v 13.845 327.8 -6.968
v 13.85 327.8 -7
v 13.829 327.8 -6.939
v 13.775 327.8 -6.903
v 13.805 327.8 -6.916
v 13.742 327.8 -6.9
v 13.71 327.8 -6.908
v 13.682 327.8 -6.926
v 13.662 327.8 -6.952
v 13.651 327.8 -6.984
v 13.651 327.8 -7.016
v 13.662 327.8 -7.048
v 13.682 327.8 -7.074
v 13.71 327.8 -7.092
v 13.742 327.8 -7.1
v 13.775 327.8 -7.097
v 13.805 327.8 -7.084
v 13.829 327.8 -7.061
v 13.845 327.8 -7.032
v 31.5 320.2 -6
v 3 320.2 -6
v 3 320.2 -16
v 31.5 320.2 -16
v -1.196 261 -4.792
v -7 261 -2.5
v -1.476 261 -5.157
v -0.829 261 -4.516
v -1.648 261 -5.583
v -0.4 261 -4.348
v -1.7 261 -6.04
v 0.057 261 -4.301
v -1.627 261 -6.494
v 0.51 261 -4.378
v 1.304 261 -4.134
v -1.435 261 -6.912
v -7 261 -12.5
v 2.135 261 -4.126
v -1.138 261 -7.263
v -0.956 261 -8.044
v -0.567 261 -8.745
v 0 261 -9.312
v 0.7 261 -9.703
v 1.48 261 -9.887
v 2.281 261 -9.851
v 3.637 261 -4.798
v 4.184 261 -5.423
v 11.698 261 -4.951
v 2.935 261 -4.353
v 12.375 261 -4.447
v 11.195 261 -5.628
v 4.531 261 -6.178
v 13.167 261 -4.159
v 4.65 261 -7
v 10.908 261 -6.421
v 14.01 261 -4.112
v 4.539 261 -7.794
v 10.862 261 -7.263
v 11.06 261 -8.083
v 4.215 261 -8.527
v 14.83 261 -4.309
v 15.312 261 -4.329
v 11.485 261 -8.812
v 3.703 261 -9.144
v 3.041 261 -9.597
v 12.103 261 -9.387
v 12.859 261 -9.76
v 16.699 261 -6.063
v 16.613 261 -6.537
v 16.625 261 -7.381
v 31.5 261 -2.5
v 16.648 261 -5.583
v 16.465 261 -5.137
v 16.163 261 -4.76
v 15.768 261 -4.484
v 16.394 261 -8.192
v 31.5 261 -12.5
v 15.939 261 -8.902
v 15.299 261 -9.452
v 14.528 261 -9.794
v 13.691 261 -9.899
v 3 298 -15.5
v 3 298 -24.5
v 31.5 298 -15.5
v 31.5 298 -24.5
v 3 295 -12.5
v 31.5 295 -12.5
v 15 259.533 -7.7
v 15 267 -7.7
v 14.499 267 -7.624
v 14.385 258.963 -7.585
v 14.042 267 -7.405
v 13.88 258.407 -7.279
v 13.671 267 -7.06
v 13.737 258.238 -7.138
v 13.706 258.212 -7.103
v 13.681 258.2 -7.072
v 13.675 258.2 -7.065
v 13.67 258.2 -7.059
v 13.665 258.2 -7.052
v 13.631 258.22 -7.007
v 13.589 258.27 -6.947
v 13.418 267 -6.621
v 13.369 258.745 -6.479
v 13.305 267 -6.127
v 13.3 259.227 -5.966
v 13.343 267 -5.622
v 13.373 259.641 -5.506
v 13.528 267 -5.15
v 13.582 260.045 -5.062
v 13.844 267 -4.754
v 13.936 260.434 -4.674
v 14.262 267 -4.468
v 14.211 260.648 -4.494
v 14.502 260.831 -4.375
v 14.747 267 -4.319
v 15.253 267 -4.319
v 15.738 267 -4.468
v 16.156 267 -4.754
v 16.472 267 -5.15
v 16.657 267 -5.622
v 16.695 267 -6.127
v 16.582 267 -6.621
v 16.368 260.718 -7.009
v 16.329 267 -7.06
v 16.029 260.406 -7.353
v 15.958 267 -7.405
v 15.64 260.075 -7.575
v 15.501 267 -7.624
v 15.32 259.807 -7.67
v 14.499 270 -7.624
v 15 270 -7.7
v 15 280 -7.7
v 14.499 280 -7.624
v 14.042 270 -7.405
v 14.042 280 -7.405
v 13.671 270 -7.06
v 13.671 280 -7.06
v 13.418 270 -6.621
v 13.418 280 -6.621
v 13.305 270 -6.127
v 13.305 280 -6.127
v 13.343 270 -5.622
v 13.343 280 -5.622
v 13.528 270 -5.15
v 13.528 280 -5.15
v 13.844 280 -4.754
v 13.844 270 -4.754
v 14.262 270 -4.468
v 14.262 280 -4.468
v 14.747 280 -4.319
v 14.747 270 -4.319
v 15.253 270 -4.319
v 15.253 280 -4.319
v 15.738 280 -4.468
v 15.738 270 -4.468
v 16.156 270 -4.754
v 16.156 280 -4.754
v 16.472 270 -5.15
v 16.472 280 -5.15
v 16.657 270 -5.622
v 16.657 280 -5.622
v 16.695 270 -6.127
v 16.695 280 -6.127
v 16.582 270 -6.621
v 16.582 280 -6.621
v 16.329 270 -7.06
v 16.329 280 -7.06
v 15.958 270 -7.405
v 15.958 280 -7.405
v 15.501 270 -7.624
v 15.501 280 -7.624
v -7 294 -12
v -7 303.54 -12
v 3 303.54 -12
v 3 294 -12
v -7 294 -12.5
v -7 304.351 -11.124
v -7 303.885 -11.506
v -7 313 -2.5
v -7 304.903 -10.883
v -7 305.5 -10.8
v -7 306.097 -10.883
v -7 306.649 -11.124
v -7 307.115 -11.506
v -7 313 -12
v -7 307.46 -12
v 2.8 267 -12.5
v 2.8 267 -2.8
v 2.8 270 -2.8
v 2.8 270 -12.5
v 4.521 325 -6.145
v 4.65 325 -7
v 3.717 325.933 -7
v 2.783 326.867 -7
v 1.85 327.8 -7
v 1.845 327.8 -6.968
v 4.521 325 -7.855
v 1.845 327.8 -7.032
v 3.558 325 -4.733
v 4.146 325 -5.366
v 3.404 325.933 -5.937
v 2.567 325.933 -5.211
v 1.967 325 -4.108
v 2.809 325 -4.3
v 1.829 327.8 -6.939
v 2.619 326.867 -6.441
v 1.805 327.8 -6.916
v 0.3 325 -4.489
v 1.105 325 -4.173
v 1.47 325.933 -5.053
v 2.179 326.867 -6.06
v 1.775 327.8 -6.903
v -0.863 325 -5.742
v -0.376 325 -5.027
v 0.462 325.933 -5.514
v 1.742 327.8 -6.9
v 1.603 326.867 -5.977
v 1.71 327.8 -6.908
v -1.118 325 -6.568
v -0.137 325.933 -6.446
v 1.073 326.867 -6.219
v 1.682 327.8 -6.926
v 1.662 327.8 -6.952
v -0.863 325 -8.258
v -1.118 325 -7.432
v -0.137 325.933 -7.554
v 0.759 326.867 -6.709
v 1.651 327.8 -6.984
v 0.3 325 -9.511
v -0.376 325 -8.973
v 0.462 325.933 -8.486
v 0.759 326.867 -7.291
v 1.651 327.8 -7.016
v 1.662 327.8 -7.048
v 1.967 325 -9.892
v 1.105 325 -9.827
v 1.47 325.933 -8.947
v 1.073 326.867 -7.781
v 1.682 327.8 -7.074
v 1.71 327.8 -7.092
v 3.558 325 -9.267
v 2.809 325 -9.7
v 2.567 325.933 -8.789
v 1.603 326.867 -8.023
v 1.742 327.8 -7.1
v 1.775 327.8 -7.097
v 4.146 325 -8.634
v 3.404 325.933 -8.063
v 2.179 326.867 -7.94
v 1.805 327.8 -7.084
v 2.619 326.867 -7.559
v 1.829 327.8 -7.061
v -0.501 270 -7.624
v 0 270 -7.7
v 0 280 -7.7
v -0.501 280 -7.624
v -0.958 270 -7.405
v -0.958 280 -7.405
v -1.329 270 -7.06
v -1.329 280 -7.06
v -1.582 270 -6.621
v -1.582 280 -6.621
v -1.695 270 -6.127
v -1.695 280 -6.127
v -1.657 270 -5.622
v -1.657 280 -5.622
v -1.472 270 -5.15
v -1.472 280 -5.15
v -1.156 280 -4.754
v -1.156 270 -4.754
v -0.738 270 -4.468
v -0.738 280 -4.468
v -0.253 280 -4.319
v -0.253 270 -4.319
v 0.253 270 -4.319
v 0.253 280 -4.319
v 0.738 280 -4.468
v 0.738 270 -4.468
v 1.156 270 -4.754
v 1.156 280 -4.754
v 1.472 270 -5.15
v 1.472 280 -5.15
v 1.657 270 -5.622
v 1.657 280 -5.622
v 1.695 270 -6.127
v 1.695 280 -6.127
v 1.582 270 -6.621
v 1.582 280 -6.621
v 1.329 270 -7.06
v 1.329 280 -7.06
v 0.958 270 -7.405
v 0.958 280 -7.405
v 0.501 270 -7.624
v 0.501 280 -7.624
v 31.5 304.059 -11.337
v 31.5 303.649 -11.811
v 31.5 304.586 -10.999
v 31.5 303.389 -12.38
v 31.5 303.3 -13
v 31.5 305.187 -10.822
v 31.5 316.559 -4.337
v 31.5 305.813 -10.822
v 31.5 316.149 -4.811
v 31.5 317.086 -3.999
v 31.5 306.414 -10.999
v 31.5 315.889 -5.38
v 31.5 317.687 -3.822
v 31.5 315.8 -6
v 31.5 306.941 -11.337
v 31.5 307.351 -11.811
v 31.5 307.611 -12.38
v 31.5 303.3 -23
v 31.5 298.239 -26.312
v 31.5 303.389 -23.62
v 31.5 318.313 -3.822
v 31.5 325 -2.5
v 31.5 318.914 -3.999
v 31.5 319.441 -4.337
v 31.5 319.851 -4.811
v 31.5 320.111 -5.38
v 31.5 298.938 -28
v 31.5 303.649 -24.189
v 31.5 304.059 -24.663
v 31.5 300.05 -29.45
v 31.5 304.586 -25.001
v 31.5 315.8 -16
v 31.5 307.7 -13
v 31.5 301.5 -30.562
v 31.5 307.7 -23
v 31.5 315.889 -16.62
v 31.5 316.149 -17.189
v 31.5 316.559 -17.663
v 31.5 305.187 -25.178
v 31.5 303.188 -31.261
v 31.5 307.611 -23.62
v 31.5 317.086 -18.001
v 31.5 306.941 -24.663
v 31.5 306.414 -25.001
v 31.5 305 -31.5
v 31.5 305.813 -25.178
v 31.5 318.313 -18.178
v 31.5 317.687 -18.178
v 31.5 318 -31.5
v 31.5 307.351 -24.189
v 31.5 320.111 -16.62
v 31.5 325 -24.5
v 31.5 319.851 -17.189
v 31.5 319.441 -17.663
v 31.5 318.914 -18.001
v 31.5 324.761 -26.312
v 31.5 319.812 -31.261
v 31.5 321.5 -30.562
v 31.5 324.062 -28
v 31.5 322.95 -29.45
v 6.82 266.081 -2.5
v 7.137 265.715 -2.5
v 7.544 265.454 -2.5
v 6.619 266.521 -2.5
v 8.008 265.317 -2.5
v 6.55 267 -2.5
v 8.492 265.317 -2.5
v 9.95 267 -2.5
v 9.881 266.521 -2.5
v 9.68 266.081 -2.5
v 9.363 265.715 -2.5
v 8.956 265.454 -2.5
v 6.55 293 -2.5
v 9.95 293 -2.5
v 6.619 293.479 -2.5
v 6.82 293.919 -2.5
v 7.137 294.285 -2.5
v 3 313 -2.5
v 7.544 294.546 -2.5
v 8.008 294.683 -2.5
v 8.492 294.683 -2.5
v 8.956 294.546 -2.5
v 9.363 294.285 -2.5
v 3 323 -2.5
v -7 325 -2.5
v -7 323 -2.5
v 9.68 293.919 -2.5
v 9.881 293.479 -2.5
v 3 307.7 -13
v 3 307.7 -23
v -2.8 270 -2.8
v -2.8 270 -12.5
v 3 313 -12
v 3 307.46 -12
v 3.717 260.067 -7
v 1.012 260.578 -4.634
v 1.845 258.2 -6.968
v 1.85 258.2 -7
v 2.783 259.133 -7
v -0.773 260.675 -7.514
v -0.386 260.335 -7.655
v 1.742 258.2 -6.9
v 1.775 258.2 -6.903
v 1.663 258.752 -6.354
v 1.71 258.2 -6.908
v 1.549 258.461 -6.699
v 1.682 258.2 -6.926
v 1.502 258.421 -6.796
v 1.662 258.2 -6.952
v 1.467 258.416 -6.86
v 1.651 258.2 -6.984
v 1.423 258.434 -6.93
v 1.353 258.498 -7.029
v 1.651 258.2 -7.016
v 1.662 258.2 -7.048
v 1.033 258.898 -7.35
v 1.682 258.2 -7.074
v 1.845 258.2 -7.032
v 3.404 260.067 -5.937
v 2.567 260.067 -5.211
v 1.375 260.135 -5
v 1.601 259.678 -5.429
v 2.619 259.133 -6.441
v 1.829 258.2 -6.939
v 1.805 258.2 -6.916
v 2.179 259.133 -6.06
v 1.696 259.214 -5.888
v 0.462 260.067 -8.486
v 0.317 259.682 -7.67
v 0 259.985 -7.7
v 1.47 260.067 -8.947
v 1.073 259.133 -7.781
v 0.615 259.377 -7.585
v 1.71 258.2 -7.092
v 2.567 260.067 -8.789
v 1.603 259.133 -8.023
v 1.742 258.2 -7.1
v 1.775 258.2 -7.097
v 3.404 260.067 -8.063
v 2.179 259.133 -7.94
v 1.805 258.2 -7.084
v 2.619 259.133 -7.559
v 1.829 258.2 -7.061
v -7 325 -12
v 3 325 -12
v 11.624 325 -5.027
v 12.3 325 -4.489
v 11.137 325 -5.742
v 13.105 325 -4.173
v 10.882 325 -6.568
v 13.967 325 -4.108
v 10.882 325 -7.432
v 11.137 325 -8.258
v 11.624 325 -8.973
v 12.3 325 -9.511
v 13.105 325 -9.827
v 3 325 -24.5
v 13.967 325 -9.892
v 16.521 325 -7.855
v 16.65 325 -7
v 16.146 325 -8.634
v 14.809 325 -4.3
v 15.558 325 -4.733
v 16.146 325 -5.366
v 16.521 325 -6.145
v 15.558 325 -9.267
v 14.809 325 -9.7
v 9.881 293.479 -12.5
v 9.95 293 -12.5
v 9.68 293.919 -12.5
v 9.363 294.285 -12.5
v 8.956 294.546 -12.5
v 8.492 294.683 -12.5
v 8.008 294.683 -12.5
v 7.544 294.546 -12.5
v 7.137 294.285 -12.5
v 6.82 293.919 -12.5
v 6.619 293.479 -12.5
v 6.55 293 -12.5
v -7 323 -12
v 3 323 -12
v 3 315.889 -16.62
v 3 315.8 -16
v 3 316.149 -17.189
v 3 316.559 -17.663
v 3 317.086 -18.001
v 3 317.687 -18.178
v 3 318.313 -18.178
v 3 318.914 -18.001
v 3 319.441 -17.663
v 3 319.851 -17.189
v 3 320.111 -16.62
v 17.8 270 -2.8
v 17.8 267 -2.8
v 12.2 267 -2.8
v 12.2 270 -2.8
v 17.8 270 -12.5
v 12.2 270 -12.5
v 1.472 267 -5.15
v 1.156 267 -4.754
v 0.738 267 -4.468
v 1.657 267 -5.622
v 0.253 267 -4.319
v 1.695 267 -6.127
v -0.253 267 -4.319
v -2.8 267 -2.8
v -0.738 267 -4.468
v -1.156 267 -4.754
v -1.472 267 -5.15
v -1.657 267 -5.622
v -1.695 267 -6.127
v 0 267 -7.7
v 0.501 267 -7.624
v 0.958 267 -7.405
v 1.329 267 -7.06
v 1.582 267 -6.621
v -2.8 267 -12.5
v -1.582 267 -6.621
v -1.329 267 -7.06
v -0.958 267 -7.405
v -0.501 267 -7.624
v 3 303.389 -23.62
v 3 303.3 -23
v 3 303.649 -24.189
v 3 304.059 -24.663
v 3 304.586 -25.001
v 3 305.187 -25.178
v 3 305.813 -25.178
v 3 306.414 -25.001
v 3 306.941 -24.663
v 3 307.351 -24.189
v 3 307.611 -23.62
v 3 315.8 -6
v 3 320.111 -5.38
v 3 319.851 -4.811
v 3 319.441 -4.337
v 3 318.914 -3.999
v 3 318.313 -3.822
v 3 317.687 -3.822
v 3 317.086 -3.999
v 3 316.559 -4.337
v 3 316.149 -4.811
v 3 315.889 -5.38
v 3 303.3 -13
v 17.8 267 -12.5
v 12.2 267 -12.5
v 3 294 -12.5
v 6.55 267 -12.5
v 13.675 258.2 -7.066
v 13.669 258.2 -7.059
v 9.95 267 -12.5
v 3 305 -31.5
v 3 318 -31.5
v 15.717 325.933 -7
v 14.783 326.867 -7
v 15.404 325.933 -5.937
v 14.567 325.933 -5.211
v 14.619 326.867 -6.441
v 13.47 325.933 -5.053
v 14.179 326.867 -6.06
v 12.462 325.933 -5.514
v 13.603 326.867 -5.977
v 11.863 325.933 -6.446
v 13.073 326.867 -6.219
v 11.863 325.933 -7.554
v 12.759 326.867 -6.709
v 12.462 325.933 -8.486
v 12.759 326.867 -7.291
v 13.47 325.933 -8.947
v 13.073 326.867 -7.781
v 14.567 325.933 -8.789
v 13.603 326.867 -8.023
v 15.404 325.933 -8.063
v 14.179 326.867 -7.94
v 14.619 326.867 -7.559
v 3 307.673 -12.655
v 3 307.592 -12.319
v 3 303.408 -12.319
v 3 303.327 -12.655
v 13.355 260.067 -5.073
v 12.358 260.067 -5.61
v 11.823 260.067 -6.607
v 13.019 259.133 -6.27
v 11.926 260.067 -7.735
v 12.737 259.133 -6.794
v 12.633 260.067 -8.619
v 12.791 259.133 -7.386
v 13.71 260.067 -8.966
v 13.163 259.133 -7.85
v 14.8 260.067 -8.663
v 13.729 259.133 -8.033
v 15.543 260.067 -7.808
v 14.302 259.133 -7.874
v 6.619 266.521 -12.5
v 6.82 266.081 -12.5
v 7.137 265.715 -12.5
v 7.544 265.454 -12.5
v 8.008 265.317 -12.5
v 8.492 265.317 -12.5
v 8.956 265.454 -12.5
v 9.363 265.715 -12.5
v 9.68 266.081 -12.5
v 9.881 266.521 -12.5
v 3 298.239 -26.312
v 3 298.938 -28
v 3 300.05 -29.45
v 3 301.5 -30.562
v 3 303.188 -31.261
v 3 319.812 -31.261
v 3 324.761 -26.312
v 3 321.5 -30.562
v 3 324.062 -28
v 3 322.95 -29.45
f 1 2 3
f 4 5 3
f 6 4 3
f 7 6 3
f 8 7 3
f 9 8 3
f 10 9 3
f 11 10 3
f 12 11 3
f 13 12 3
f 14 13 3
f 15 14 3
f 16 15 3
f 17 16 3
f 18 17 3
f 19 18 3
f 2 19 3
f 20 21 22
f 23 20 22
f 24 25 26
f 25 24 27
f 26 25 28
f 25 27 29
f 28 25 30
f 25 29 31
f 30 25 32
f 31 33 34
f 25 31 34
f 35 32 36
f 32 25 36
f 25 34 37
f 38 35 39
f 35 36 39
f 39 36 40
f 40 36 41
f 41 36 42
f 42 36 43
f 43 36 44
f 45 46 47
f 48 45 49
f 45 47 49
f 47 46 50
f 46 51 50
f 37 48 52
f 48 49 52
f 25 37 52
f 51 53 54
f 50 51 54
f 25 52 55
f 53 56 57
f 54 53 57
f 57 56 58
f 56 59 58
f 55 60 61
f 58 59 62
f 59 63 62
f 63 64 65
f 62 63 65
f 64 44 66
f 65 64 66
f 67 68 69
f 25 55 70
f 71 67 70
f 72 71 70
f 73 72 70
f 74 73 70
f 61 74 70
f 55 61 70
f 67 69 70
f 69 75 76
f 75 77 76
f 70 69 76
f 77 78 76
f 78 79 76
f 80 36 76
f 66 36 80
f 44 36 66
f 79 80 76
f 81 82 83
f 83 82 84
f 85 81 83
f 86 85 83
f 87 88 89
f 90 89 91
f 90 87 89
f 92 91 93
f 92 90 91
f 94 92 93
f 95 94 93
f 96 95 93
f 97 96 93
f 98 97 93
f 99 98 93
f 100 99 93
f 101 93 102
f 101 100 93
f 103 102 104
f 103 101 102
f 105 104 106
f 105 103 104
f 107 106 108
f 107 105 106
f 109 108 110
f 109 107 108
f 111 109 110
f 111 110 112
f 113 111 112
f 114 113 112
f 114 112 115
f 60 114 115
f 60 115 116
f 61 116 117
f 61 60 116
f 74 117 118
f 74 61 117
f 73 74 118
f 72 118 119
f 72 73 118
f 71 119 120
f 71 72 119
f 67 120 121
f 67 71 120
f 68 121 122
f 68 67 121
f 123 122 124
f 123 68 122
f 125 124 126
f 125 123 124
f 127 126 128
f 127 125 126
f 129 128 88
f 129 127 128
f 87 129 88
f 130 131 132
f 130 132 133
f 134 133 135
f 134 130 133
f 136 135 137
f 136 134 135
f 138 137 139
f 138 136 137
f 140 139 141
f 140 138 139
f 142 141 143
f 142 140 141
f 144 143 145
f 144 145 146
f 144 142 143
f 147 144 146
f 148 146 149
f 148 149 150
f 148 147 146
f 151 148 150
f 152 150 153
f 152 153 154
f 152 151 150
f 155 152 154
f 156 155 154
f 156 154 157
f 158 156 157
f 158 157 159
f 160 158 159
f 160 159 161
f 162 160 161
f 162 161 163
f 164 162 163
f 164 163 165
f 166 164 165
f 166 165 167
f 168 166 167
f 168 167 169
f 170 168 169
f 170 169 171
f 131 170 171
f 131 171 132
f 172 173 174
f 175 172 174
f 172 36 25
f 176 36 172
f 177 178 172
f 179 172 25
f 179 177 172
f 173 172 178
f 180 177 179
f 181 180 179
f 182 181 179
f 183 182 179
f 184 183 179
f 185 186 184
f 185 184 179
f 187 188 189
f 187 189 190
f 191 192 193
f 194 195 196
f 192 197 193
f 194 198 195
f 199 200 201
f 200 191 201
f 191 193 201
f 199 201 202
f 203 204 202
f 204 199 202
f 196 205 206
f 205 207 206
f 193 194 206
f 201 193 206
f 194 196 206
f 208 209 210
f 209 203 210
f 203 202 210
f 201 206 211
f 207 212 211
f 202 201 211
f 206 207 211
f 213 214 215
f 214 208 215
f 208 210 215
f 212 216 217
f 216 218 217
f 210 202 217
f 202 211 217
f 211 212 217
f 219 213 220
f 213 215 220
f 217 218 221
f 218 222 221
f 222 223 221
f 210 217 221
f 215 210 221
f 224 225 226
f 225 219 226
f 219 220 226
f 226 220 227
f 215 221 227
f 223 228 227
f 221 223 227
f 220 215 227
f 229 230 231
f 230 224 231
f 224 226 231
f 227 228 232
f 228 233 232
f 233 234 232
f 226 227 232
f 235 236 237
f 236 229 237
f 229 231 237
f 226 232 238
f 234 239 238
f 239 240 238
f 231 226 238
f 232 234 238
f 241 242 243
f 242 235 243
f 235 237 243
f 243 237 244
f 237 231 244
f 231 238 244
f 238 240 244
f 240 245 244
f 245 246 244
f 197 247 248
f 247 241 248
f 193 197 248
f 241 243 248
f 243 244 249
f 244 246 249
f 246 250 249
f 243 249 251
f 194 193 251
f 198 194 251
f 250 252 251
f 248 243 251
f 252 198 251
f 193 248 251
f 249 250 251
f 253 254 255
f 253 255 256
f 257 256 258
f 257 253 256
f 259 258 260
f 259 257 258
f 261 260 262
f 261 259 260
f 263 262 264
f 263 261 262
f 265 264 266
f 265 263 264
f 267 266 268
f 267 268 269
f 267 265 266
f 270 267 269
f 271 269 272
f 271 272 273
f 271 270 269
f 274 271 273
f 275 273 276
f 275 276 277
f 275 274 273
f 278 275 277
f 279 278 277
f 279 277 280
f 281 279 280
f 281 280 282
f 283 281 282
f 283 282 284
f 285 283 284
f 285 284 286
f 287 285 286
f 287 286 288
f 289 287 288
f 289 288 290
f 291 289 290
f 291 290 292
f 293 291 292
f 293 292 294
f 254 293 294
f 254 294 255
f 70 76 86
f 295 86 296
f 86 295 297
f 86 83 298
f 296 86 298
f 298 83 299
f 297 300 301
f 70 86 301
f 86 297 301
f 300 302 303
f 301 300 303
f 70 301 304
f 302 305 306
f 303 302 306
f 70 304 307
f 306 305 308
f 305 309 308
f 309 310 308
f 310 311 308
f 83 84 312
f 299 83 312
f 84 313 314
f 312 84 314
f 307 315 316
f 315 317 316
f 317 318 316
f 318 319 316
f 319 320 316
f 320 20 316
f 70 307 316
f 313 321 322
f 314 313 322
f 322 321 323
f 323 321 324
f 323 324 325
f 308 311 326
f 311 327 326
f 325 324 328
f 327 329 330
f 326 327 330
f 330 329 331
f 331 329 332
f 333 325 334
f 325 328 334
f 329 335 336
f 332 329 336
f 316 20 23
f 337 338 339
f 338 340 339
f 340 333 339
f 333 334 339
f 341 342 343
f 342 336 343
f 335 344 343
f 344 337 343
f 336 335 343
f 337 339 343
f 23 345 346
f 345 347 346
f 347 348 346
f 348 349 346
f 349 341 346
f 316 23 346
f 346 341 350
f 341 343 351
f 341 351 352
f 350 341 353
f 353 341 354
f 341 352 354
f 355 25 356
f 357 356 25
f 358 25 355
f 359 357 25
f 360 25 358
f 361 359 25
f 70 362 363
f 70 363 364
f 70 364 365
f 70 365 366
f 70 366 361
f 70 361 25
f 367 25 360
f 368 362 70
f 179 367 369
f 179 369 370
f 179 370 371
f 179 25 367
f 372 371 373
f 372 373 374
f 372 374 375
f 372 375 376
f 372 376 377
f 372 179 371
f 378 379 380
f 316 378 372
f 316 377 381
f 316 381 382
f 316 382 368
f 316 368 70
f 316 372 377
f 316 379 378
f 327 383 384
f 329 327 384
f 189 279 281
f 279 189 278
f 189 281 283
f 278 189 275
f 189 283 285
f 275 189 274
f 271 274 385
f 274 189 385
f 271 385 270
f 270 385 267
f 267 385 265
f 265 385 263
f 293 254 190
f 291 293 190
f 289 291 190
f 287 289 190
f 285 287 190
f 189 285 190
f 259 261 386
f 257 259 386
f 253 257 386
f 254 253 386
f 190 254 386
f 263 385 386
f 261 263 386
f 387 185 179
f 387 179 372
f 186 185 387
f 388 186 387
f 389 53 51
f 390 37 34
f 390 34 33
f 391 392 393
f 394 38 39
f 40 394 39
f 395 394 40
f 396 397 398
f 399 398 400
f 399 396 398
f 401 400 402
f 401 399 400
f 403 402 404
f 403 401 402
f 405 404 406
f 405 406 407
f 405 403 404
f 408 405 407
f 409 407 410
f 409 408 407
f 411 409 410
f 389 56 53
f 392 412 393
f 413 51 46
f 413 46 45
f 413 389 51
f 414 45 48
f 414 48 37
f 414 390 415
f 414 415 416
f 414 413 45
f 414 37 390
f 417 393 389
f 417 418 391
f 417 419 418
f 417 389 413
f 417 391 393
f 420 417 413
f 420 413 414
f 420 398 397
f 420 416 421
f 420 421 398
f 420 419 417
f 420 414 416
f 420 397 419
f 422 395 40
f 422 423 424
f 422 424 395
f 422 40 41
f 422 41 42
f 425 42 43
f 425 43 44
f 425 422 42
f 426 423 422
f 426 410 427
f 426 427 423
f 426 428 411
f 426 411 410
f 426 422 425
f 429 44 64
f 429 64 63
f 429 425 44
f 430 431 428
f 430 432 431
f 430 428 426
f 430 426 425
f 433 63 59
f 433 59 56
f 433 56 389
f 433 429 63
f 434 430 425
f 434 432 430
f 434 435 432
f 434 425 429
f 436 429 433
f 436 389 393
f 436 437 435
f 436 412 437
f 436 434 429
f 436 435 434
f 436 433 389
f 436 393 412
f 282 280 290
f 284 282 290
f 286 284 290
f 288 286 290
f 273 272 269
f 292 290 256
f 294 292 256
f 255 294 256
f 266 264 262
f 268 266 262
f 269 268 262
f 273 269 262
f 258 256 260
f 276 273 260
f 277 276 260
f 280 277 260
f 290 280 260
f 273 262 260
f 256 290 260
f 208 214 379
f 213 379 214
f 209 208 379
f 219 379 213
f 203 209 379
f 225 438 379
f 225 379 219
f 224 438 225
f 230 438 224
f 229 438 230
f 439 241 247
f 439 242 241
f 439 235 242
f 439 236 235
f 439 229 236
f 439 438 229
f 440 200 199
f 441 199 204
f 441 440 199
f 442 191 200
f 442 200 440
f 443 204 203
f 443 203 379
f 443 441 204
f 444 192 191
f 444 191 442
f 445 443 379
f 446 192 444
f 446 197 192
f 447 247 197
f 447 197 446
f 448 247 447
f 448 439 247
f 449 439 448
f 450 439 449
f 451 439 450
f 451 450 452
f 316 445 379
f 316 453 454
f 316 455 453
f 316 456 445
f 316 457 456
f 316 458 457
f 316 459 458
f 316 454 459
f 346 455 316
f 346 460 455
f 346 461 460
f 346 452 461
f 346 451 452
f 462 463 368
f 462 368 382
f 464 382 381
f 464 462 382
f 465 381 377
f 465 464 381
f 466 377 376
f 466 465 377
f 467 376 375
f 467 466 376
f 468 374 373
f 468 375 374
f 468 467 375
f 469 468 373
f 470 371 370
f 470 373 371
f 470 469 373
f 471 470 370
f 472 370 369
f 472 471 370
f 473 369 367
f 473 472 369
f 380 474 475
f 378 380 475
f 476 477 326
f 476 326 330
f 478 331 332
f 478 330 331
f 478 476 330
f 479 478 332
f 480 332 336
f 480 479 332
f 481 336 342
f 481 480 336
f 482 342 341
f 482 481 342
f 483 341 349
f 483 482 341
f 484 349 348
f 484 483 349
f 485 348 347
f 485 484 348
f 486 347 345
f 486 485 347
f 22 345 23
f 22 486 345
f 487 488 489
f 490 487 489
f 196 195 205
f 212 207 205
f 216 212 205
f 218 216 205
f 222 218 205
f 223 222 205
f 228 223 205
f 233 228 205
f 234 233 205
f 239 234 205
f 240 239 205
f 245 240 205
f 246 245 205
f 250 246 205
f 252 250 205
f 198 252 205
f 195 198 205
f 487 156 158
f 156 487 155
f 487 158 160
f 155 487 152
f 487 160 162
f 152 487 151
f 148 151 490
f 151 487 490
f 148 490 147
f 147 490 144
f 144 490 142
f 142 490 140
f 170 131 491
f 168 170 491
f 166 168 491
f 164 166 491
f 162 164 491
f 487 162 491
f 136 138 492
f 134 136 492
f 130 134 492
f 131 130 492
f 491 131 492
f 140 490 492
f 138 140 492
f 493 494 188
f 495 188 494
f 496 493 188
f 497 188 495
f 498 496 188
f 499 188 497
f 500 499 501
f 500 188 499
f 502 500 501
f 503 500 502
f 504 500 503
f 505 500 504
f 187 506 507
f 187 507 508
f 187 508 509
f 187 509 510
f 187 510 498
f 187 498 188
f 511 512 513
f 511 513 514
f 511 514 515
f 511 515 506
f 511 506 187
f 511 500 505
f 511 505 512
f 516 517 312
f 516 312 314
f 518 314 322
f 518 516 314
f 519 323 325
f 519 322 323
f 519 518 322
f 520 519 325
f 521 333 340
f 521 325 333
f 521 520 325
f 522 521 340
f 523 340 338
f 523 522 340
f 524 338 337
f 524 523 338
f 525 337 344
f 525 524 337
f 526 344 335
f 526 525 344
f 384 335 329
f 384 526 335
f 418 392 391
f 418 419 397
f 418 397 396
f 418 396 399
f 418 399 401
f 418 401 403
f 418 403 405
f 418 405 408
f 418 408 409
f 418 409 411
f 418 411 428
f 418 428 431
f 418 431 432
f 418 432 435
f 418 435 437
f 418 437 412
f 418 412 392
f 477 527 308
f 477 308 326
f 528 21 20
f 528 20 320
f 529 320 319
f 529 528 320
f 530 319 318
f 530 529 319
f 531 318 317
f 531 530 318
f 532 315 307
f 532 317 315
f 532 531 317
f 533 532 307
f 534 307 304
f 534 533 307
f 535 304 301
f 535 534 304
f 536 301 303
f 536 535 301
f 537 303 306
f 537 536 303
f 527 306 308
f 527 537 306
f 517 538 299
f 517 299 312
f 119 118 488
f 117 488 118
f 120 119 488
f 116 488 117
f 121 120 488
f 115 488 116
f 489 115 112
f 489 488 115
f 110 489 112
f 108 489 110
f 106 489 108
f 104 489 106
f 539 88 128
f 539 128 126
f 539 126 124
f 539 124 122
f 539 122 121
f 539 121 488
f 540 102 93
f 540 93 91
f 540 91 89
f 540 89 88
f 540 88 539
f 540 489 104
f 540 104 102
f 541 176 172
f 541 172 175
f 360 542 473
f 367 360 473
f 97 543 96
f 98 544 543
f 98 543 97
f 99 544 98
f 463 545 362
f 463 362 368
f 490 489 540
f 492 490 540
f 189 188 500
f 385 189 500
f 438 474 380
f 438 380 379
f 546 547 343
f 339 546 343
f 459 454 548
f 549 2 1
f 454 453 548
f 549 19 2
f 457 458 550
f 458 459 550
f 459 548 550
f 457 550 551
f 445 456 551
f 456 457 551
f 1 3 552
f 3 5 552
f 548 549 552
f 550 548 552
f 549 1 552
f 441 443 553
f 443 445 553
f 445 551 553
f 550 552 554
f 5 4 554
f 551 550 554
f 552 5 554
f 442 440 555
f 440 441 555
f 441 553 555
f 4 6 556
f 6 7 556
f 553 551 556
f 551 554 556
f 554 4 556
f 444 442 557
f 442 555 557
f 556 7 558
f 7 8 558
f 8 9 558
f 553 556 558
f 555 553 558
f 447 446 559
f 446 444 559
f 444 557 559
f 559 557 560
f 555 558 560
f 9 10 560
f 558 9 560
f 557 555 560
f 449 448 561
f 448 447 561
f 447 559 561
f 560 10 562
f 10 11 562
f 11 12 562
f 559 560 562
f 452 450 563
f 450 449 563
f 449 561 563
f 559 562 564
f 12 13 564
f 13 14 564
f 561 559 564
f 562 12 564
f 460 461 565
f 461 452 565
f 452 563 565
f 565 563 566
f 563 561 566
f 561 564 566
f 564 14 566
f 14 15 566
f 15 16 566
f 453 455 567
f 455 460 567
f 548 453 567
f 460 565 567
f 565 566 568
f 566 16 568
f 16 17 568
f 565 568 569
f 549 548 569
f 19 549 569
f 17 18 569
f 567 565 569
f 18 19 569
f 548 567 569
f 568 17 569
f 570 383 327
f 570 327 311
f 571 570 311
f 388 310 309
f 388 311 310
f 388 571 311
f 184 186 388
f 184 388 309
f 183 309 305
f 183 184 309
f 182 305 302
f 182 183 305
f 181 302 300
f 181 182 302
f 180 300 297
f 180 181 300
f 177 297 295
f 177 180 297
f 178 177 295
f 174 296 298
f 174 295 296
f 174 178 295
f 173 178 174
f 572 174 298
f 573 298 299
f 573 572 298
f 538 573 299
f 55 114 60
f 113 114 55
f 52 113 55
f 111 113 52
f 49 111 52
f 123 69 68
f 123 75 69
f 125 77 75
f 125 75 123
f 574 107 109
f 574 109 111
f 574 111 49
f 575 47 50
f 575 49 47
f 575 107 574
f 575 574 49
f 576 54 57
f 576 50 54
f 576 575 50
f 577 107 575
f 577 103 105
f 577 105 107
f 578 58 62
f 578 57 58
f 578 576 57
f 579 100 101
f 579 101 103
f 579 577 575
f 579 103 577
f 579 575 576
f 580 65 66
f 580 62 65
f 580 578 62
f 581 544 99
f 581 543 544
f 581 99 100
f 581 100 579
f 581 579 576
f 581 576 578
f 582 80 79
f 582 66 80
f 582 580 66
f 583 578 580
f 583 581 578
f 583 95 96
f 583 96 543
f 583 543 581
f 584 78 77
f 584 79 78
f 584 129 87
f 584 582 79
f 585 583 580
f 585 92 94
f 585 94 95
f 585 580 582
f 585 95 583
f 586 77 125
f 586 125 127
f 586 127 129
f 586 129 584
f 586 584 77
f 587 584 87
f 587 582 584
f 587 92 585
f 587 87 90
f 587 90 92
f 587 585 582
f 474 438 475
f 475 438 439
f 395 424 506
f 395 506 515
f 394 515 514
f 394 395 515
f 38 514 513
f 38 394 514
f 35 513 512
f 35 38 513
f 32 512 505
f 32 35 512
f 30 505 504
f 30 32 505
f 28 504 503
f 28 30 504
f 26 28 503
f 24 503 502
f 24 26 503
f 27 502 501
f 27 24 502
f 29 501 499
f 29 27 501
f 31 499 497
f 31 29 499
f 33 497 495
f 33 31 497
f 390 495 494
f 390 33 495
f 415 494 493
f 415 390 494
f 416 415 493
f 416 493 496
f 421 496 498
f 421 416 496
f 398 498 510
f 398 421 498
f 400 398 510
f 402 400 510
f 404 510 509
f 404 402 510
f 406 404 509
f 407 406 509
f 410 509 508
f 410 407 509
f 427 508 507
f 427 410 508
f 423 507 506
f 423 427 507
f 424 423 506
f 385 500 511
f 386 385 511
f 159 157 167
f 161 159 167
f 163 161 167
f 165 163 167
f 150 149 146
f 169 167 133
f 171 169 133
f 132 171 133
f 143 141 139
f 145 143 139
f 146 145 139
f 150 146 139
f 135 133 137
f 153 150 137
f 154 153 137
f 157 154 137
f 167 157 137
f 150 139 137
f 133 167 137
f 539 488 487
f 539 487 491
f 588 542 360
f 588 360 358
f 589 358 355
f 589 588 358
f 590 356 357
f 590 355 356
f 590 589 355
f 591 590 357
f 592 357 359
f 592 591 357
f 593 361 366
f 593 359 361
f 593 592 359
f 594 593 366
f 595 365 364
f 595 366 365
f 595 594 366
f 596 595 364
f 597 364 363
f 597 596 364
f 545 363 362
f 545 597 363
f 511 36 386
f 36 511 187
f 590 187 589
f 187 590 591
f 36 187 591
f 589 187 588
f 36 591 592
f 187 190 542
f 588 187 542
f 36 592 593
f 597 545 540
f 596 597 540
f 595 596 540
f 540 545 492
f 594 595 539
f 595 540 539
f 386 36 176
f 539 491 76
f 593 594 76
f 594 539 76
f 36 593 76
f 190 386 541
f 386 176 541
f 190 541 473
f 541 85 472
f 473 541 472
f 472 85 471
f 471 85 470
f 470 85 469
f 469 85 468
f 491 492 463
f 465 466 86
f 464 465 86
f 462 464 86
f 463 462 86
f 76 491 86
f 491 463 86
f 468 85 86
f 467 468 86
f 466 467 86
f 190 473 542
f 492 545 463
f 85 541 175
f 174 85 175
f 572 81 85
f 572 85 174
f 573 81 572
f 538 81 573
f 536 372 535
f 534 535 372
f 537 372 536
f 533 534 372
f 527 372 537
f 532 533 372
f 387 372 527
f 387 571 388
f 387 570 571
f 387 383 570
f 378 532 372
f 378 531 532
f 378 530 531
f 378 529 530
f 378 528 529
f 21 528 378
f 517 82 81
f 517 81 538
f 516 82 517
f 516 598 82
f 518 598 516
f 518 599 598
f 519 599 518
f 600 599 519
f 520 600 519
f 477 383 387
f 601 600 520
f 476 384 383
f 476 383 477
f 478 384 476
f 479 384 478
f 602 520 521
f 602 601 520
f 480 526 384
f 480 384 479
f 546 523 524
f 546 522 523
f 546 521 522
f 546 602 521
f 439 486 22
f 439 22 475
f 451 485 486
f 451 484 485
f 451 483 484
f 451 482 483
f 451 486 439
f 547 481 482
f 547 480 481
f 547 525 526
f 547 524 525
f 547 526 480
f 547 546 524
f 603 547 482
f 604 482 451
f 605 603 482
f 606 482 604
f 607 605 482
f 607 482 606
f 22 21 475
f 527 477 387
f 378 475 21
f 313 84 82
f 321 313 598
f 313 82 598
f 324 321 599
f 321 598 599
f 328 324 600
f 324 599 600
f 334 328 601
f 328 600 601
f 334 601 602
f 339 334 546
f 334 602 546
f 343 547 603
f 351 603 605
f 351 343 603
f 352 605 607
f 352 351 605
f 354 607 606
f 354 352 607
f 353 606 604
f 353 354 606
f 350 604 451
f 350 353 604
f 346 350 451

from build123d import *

# Parameters (mm, degrees)
BOX005009018_W            = 20
BOX005009018_H            = 10
BOX005009018_DEPTH        = 26
BOX005009017_W            = 20
BOX005009017_H            = 33
BOX005009017_DEPTH        = 26
CYLINDER027_R             = 3
CYLINDER027_DEPTH         = 4
BOX005009016_W            = 16
BOX005009016_H            = 5.6
BOX005009016_DEPTH        = 3
CYLINDER026_R             = 1.7
CYLINDER026_DEPTH         = 30
FUSION024_PITCH_ANGLE     = 90
FUSION024_PLACEMENT_ANGLE = 90
FUSION023_PITCH_ANGLE     = 90
FUSION023_PLACEMENT_ANGLE = 90
CYLINDER025_R             = 1.7
CYLINDER025_DEPTH         = 20
BOX005009015_W            = 3.4
BOX005009015_H            = 26
BOX005009015_DEPTH        = 20
CYLINDER024_R             = 1.7
CYLINDER024_DEPTH         = 20
BOX005009009_W            = 10
BOX005009009_H            = 4.4
BOX005009009_DEPTH        = 70
CYLINDER015_R             = 2.2
CYLINDER015_DEPTH         = 70
CYLINDER014_R             = 2.2
CYLINDER014_DEPTH         = 70
FUSION009_PITCH_ANGLE     = 90
FUSION011_PITCH_ANGLE     = 90
CYLINDER022_R             = 3
CYLINDER022_DEPTH         = 6
CYLINDER022_ROLL_ANGLE    = 90
CHAMFER014_SIZE           = 2.9
CHAMFER012_SIZE           = 2.9
CHAMFER010_SIZE           = 2.9
CHAMFER008_SIZE           = 2.9
BOX005009011_W            = 41
BOX005009011_H            = 60
BOX005009011_DEPTH        = 29
BOX005009010_W            = 38.5
BOX005009010_H            = 64
BOX005009010_DEPTH        = 29
CHAMFER026_SIZE           = 3
FILLET003_R               = 7
FILLET004_R               = 7


with BuildPart() as cube005:
    # Box005009018 → Box005009018 (new body)
    with BuildSketch(Plane(origin=(-17, 313, -27), x_dir=(1, 0, 0), z_dir=(0, 0, 1))):
        with Locations((10, 5)):
            Rectangle(BOX005009018_W, BOX005009018_H)
    extrude(amount=BOX005009018_DEPTH)


with BuildPart() as fusion027:
    # Box005009017 → Box005009017 (new body)
    with BuildSketch(Plane(origin=(-17, 294, -38), x_dir=(1, 0, 0), z_dir=(0, 0, 1))):
        with Locations((10, 16.5)):
            Rectangle(BOX005009017_W, BOX005009017_H)
    extrude(amount=BOX005009017_DEPTH)

    # Fusion027: union Cube005
    add(cube005.part)


with BuildPart() as cylinder018:
    # Cylinder027 → Cylinder027 (new body)
    with BuildSketch(Plane.XY):
        Circle(CYLINDER027_R)
    extrude(amount=CYLINDER027_DEPTH)


with BuildPart() as cube003:
    # Box005009016 → Box005009016 (new body)
    with BuildSketch(Plane(origin=(-3.2, -2.8, 18), x_dir=(1, 0, 0), z_dir=(0, 0, 1))):
        with Locations((8, 2.8)):
            Rectangle(BOX005009016_W, BOX005009016_H)
    extrude(amount=BOX005009016_DEPTH)


with BuildPart() as cylinder017:
    # Cylinder026 → Cylinder026 (new body)
    with BuildSketch(Plane.XY.offset(1)):
        Circle(CYLINDER026_R)
    extrude(amount=CYLINDER026_DEPTH)


with BuildPart() as m3_cavity001:
    # Fusion024 base: copy of Cylinder017
    add(cylinder017.part)

    # Fusion024: union Cylinder018, Cube003
    add(cylinder018.part)
    add(cube003.part)


with BuildPart() as m3_cavity001_1:
    # Fusion024 pitch: moved
    add(m3_cavity001.part.rotate(Axis((0, 0, 0), (0, 1, 0)), FUSION024_PITCH_ANGLE))


with BuildPart() as m3_cavity001_2:
    # Fusion024 placement: moved
    add(m3_cavity001_1.part.moved(Location((15, 249, -6))).rotate(Axis((15, 249, -6), (0, 0, 1)), FUSION024_PLACEMENT_ANGLE))


with BuildPart() as m3_cavity:
    # Fusion023 base: copy of Cylinder017
    add(cylinder017.part)

    # Fusion023: union Cylinder018, Cube003
    add(cylinder018.part)
    add(cube003.part)


with BuildPart() as m3_cavity_1:
    # Fusion023 pitch: moved
    add(m3_cavity.part.rotate(Axis((0, 0, 0), (0, 1, 0)), FUSION023_PITCH_ANGLE))


with BuildPart() as m3_cavity_2:
    # Fusion023 placement: moved
    add(m3_cavity_1.part.moved(Location((0, 249, -6))).rotate(Axis((0, 249, -6), (0, 0, 1)), FUSION023_PLACEMENT_ANGLE))


with BuildPart() as cylinder016:
    # Cylinder025 → Cylinder025 (new body)
    with BuildSketch(Plane(origin=(8.25, 293, -17), x_dir=(1, 0, 0), z_dir=(0, 0, 1))):
        Circle(CYLINDER025_R)
    extrude(amount=CYLINDER025_DEPTH)


with BuildPart() as cube002:
    # Box005009015 → Box005009015 (new body)
    with BuildSketch(Plane(origin=(6.55, 267, -17), x_dir=(1, 0, 0), z_dir=(0, 0, 1))):
        with Locations((1.7, 13)):
            Rectangle(BOX005009015_W, BOX005009015_H)
    extrude(amount=BOX005009015_DEPTH)


with BuildPart() as slider_screw_slot:
    # Cylinder024 → Cylinder024 (new body)
    with BuildSketch(Plane(origin=(8.25, 267, -17), x_dir=(1, 0, 0), z_dir=(0, 0, 1))):
        Circle(CYLINDER024_R)
    extrude(amount=CYLINDER024_DEPTH)

    # Fusion022: union Cylinder016, Cube002
    add(cylinder016.part)
    add(cube002.part)


with BuildPart() as cube001:
    # Box005009009 → Box005009009 (new body)
    with BuildSketch(Plane(origin=(0, -2.2, 0), x_dir=(1, 0, 0), z_dir=(0, 0, 1))):
        with Locations((5, 2.2)):
            Rectangle(BOX005009009_W, BOX005009009_H)
    extrude(amount=BOX005009009_DEPTH)


with BuildPart() as cylinder014:
    # Cylinder015 → Cylinder015 (new body)
    with BuildSketch(Plane(origin=(10, 0, 0), x_dir=(1, 0, 0), z_dir=(0, 0, 1))):
        Circle(CYLINDER015_R)
    extrude(amount=CYLINDER015_DEPTH)


with BuildPart() as cylinder013:
    # Cylinder014 → Cylinder014 (new body)
    with BuildSketch(Plane.XY):
        Circle(CYLINDER014_R)
    extrude(amount=CYLINDER014_DEPTH)


with BuildPart() as m4_slot001:
    # Fusion009 base: copy of Cylinder013
    add(cylinder013.part)

    # Fusion009: union Cube001, Cylinder014
    add(cube001.part)
    add(cylinder014.part)


with BuildPart() as m4_slot001_1:
    # Fusion009 pitch: moved
    add(m4_slot001.part.rotate(Axis((0, 0, 0), (0, 1, 0)), FUSION009_PITCH_ANGLE))


with BuildPart() as m4_slot001_2:
    # Fusion009 placement: moved
    add(m4_slot001_1.part.moved(Location((-26, 305.5, -13))))


with BuildPart() as fusion019:
    # Fusion011 base: copy of Cylinder013
    add(cylinder013.part)

    # Fusion011: union Cube001, Cylinder014
    add(cube001.part)
    add(cylinder014.part)


with BuildPart() as fusion019_1:
    # Fusion011 pitch: moved
    add(fusion019.part.rotate(Axis((0, 0, 0), (0, 1, 0)), FUSION011_PITCH_ANGLE))


with BuildPart() as fusion019_2:
    # Fusion011 placement: moved
    add(fusion019_1.part.moved(Location((-26, 318, -6))))

    # Fusion019: union M4 slot001
    add(m4_slot001_2.part)


with BuildPart() as lug:
    # Cylinder022 → Cylinder022 (new body)
    with BuildSketch(Plane.XY):
        Circle(CYLINDER022_R)
    extrude(amount=CYLINDER022_DEPTH)


with BuildPart() as lug_1:
    # Cylinder022 roll: moved
    add(lug.part.rotate(Axis((0, 0, 0), (1, 0, 0)), CYLINDER022_ROLL_ANGLE))


with BuildPart() as lug_2:
    # Cylinder022 placement: moved
    add(lug_1.part.moved(Location((7.75, 328.8, -7))))


with BuildPart() as chamfer014:
    # Chamfer014 base: copy of lug
    add(lug_2.part)

    # Chamfer014
    chamfer014_edges = [chamfer014.edges().sort_by_distance(p)[0] for p in [
        (4.75, 328.8, -7),
    ]]
    chamfer(chamfer014_edges, length=CHAMFER014_SIZE)


with BuildPart() as chamfer014_1:
    # Chamfer014 placement: moved
    add(chamfer014.part.moved(Location((6, -1, 0))))


with BuildPart() as part_mirroring002:
    # Part__Mirroring002: instance of Chamfer014
    add(chamfer014_1.part.mirror(Plane(origin=(0, 200, 0), x_dir=(1, 0, 0), z_dir=(0, 1, 0))))


with BuildPart() as chamfer012:
    # Chamfer012 base: copy of lug
    add(lug_2.part)

    # Chamfer012
    chamfer012_edges = [chamfer012.edges().sort_by_distance(p)[0] for p in [
        (4.75, 328.8, -7),
    ]]
    chamfer(chamfer012_edges, length=CHAMFER012_SIZE)


with BuildPart() as chamfer012_1:
    # Chamfer012 placement: moved
    add(chamfer012.part.moved(Location((-6, -1, 0))))


with BuildPart() as fusion016:
    # Part__Mirroring: instance of Chamfer012
    add(chamfer012_1.part.mirror(Plane(origin=(0, 200, 0), x_dir=(1, 0, 0), z_dir=(0, 1, 0))))

    # Fusion016: union Part__Mirroring002
    add(part_mirroring002.part)


with BuildPart() as fusion016_1:
    # Fusion016 placement: moved
    add(fusion016.part.moved(Location((0, 186, 0))))


with BuildPart() as chamfer010:
    # Chamfer010 base: copy of lug
    add(lug_2.part)

    # Chamfer010
    chamfer010_edges = [chamfer010.edges().sort_by_distance(p)[0] for p in [
        (4.75, 328.8, -7),
    ]]
    chamfer(chamfer010_edges, length=CHAMFER010_SIZE)


with BuildPart() as chamfer010_1:
    # Chamfer010 placement: moved
    add(chamfer010.part.moved(Location((6, -1, 0))))


with BuildPart() as lugs:
    # Chamfer008 base: copy of lug
    add(lug_2.part)

    # Chamfer008
    chamfer008_edges = [lugs.edges().sort_by_distance(p)[0] for p in [
        (4.75, 328.8, -7),
    ]]
    chamfer(chamfer008_edges, length=CHAMFER008_SIZE)


with BuildPart() as lugs_1:
    # Chamfer008 placement: moved
    add(lugs.part.moved(Location((-6, -1, 0))))

    # Fusion014: union Chamfer010
    add(chamfer010_1.part)


with BuildPart() as slider002:
    # Box005009011 → Box005009011 (new body)
    with BuildSketch(Plane(origin=(-8, 238, -41.5), x_dir=(1, 0, 0), z_dir=(0, 0, 1))):
        with Locations((20.5, 30)):
            Rectangle(BOX005009011_W, BOX005009011_H)
    extrude(amount=BOX005009011_DEPTH)


with BuildPart() as slider_support:
    # Box005009010 → Box005009010 (new body)
    with BuildSketch(Plane(origin=(-7, 261, -31.5), x_dir=(1, 0, 0), z_dir=(0, 0, 1))):
        with Locations((19.25, 32)):
            Rectangle(BOX005009010_W, BOX005009010_H)
    extrude(amount=BOX005009010_DEPTH)

    # Cut015: cut slider002
    add(slider002.part, mode=Mode.SUBTRACT)

    # Fusion015: union lugs
    add(lugs_1.part)

    # Fusion018: union Fusion016
    add(fusion016_1.part)

    # Cut018: cut Fusion019
    add(fusion019_2.part, mode=Mode.SUBTRACT)

    # Cut022: cut slider-screw-slot
    add(slider_screw_slot.part, mode=Mode.SUBTRACT)

    # Chamfer026
    chamfer026_edges = [slider_support.edges().sort_by_distance(p)[0] for p in [
        (12.25, 298, -12.5),
    ]]
    chamfer(chamfer026_edges, length=CHAMFER026_SIZE)

    # Fillet003
    fillet003_edges = [slider_support.edges().sort_by_distance(p)[0] for p in [
        (12.25, 298, -31.5),
    ]]
    fillet(fillet003_edges, radius=FILLET003_R)

    # Fillet004
    fillet004_edges = [slider_support.edges().sort_by_distance(p)[0] for p in [
        (12.25, 325, -31.5),
    ]]
    fillet(fillet004_edges, radius=FILLET004_R)

    # Cut023: cut M3-cavity
    add(m3_cavity_2.part, mode=Mode.SUBTRACT)

    # Cut024: cut M3-cavity001
    add(m3_cavity001_2.part, mode=Mode.SUBTRACT)

    # Cut027: cut Fusion027
    add(fusion027.part, mode=Mode.SUBTRACT)


solid = slider_support.part
